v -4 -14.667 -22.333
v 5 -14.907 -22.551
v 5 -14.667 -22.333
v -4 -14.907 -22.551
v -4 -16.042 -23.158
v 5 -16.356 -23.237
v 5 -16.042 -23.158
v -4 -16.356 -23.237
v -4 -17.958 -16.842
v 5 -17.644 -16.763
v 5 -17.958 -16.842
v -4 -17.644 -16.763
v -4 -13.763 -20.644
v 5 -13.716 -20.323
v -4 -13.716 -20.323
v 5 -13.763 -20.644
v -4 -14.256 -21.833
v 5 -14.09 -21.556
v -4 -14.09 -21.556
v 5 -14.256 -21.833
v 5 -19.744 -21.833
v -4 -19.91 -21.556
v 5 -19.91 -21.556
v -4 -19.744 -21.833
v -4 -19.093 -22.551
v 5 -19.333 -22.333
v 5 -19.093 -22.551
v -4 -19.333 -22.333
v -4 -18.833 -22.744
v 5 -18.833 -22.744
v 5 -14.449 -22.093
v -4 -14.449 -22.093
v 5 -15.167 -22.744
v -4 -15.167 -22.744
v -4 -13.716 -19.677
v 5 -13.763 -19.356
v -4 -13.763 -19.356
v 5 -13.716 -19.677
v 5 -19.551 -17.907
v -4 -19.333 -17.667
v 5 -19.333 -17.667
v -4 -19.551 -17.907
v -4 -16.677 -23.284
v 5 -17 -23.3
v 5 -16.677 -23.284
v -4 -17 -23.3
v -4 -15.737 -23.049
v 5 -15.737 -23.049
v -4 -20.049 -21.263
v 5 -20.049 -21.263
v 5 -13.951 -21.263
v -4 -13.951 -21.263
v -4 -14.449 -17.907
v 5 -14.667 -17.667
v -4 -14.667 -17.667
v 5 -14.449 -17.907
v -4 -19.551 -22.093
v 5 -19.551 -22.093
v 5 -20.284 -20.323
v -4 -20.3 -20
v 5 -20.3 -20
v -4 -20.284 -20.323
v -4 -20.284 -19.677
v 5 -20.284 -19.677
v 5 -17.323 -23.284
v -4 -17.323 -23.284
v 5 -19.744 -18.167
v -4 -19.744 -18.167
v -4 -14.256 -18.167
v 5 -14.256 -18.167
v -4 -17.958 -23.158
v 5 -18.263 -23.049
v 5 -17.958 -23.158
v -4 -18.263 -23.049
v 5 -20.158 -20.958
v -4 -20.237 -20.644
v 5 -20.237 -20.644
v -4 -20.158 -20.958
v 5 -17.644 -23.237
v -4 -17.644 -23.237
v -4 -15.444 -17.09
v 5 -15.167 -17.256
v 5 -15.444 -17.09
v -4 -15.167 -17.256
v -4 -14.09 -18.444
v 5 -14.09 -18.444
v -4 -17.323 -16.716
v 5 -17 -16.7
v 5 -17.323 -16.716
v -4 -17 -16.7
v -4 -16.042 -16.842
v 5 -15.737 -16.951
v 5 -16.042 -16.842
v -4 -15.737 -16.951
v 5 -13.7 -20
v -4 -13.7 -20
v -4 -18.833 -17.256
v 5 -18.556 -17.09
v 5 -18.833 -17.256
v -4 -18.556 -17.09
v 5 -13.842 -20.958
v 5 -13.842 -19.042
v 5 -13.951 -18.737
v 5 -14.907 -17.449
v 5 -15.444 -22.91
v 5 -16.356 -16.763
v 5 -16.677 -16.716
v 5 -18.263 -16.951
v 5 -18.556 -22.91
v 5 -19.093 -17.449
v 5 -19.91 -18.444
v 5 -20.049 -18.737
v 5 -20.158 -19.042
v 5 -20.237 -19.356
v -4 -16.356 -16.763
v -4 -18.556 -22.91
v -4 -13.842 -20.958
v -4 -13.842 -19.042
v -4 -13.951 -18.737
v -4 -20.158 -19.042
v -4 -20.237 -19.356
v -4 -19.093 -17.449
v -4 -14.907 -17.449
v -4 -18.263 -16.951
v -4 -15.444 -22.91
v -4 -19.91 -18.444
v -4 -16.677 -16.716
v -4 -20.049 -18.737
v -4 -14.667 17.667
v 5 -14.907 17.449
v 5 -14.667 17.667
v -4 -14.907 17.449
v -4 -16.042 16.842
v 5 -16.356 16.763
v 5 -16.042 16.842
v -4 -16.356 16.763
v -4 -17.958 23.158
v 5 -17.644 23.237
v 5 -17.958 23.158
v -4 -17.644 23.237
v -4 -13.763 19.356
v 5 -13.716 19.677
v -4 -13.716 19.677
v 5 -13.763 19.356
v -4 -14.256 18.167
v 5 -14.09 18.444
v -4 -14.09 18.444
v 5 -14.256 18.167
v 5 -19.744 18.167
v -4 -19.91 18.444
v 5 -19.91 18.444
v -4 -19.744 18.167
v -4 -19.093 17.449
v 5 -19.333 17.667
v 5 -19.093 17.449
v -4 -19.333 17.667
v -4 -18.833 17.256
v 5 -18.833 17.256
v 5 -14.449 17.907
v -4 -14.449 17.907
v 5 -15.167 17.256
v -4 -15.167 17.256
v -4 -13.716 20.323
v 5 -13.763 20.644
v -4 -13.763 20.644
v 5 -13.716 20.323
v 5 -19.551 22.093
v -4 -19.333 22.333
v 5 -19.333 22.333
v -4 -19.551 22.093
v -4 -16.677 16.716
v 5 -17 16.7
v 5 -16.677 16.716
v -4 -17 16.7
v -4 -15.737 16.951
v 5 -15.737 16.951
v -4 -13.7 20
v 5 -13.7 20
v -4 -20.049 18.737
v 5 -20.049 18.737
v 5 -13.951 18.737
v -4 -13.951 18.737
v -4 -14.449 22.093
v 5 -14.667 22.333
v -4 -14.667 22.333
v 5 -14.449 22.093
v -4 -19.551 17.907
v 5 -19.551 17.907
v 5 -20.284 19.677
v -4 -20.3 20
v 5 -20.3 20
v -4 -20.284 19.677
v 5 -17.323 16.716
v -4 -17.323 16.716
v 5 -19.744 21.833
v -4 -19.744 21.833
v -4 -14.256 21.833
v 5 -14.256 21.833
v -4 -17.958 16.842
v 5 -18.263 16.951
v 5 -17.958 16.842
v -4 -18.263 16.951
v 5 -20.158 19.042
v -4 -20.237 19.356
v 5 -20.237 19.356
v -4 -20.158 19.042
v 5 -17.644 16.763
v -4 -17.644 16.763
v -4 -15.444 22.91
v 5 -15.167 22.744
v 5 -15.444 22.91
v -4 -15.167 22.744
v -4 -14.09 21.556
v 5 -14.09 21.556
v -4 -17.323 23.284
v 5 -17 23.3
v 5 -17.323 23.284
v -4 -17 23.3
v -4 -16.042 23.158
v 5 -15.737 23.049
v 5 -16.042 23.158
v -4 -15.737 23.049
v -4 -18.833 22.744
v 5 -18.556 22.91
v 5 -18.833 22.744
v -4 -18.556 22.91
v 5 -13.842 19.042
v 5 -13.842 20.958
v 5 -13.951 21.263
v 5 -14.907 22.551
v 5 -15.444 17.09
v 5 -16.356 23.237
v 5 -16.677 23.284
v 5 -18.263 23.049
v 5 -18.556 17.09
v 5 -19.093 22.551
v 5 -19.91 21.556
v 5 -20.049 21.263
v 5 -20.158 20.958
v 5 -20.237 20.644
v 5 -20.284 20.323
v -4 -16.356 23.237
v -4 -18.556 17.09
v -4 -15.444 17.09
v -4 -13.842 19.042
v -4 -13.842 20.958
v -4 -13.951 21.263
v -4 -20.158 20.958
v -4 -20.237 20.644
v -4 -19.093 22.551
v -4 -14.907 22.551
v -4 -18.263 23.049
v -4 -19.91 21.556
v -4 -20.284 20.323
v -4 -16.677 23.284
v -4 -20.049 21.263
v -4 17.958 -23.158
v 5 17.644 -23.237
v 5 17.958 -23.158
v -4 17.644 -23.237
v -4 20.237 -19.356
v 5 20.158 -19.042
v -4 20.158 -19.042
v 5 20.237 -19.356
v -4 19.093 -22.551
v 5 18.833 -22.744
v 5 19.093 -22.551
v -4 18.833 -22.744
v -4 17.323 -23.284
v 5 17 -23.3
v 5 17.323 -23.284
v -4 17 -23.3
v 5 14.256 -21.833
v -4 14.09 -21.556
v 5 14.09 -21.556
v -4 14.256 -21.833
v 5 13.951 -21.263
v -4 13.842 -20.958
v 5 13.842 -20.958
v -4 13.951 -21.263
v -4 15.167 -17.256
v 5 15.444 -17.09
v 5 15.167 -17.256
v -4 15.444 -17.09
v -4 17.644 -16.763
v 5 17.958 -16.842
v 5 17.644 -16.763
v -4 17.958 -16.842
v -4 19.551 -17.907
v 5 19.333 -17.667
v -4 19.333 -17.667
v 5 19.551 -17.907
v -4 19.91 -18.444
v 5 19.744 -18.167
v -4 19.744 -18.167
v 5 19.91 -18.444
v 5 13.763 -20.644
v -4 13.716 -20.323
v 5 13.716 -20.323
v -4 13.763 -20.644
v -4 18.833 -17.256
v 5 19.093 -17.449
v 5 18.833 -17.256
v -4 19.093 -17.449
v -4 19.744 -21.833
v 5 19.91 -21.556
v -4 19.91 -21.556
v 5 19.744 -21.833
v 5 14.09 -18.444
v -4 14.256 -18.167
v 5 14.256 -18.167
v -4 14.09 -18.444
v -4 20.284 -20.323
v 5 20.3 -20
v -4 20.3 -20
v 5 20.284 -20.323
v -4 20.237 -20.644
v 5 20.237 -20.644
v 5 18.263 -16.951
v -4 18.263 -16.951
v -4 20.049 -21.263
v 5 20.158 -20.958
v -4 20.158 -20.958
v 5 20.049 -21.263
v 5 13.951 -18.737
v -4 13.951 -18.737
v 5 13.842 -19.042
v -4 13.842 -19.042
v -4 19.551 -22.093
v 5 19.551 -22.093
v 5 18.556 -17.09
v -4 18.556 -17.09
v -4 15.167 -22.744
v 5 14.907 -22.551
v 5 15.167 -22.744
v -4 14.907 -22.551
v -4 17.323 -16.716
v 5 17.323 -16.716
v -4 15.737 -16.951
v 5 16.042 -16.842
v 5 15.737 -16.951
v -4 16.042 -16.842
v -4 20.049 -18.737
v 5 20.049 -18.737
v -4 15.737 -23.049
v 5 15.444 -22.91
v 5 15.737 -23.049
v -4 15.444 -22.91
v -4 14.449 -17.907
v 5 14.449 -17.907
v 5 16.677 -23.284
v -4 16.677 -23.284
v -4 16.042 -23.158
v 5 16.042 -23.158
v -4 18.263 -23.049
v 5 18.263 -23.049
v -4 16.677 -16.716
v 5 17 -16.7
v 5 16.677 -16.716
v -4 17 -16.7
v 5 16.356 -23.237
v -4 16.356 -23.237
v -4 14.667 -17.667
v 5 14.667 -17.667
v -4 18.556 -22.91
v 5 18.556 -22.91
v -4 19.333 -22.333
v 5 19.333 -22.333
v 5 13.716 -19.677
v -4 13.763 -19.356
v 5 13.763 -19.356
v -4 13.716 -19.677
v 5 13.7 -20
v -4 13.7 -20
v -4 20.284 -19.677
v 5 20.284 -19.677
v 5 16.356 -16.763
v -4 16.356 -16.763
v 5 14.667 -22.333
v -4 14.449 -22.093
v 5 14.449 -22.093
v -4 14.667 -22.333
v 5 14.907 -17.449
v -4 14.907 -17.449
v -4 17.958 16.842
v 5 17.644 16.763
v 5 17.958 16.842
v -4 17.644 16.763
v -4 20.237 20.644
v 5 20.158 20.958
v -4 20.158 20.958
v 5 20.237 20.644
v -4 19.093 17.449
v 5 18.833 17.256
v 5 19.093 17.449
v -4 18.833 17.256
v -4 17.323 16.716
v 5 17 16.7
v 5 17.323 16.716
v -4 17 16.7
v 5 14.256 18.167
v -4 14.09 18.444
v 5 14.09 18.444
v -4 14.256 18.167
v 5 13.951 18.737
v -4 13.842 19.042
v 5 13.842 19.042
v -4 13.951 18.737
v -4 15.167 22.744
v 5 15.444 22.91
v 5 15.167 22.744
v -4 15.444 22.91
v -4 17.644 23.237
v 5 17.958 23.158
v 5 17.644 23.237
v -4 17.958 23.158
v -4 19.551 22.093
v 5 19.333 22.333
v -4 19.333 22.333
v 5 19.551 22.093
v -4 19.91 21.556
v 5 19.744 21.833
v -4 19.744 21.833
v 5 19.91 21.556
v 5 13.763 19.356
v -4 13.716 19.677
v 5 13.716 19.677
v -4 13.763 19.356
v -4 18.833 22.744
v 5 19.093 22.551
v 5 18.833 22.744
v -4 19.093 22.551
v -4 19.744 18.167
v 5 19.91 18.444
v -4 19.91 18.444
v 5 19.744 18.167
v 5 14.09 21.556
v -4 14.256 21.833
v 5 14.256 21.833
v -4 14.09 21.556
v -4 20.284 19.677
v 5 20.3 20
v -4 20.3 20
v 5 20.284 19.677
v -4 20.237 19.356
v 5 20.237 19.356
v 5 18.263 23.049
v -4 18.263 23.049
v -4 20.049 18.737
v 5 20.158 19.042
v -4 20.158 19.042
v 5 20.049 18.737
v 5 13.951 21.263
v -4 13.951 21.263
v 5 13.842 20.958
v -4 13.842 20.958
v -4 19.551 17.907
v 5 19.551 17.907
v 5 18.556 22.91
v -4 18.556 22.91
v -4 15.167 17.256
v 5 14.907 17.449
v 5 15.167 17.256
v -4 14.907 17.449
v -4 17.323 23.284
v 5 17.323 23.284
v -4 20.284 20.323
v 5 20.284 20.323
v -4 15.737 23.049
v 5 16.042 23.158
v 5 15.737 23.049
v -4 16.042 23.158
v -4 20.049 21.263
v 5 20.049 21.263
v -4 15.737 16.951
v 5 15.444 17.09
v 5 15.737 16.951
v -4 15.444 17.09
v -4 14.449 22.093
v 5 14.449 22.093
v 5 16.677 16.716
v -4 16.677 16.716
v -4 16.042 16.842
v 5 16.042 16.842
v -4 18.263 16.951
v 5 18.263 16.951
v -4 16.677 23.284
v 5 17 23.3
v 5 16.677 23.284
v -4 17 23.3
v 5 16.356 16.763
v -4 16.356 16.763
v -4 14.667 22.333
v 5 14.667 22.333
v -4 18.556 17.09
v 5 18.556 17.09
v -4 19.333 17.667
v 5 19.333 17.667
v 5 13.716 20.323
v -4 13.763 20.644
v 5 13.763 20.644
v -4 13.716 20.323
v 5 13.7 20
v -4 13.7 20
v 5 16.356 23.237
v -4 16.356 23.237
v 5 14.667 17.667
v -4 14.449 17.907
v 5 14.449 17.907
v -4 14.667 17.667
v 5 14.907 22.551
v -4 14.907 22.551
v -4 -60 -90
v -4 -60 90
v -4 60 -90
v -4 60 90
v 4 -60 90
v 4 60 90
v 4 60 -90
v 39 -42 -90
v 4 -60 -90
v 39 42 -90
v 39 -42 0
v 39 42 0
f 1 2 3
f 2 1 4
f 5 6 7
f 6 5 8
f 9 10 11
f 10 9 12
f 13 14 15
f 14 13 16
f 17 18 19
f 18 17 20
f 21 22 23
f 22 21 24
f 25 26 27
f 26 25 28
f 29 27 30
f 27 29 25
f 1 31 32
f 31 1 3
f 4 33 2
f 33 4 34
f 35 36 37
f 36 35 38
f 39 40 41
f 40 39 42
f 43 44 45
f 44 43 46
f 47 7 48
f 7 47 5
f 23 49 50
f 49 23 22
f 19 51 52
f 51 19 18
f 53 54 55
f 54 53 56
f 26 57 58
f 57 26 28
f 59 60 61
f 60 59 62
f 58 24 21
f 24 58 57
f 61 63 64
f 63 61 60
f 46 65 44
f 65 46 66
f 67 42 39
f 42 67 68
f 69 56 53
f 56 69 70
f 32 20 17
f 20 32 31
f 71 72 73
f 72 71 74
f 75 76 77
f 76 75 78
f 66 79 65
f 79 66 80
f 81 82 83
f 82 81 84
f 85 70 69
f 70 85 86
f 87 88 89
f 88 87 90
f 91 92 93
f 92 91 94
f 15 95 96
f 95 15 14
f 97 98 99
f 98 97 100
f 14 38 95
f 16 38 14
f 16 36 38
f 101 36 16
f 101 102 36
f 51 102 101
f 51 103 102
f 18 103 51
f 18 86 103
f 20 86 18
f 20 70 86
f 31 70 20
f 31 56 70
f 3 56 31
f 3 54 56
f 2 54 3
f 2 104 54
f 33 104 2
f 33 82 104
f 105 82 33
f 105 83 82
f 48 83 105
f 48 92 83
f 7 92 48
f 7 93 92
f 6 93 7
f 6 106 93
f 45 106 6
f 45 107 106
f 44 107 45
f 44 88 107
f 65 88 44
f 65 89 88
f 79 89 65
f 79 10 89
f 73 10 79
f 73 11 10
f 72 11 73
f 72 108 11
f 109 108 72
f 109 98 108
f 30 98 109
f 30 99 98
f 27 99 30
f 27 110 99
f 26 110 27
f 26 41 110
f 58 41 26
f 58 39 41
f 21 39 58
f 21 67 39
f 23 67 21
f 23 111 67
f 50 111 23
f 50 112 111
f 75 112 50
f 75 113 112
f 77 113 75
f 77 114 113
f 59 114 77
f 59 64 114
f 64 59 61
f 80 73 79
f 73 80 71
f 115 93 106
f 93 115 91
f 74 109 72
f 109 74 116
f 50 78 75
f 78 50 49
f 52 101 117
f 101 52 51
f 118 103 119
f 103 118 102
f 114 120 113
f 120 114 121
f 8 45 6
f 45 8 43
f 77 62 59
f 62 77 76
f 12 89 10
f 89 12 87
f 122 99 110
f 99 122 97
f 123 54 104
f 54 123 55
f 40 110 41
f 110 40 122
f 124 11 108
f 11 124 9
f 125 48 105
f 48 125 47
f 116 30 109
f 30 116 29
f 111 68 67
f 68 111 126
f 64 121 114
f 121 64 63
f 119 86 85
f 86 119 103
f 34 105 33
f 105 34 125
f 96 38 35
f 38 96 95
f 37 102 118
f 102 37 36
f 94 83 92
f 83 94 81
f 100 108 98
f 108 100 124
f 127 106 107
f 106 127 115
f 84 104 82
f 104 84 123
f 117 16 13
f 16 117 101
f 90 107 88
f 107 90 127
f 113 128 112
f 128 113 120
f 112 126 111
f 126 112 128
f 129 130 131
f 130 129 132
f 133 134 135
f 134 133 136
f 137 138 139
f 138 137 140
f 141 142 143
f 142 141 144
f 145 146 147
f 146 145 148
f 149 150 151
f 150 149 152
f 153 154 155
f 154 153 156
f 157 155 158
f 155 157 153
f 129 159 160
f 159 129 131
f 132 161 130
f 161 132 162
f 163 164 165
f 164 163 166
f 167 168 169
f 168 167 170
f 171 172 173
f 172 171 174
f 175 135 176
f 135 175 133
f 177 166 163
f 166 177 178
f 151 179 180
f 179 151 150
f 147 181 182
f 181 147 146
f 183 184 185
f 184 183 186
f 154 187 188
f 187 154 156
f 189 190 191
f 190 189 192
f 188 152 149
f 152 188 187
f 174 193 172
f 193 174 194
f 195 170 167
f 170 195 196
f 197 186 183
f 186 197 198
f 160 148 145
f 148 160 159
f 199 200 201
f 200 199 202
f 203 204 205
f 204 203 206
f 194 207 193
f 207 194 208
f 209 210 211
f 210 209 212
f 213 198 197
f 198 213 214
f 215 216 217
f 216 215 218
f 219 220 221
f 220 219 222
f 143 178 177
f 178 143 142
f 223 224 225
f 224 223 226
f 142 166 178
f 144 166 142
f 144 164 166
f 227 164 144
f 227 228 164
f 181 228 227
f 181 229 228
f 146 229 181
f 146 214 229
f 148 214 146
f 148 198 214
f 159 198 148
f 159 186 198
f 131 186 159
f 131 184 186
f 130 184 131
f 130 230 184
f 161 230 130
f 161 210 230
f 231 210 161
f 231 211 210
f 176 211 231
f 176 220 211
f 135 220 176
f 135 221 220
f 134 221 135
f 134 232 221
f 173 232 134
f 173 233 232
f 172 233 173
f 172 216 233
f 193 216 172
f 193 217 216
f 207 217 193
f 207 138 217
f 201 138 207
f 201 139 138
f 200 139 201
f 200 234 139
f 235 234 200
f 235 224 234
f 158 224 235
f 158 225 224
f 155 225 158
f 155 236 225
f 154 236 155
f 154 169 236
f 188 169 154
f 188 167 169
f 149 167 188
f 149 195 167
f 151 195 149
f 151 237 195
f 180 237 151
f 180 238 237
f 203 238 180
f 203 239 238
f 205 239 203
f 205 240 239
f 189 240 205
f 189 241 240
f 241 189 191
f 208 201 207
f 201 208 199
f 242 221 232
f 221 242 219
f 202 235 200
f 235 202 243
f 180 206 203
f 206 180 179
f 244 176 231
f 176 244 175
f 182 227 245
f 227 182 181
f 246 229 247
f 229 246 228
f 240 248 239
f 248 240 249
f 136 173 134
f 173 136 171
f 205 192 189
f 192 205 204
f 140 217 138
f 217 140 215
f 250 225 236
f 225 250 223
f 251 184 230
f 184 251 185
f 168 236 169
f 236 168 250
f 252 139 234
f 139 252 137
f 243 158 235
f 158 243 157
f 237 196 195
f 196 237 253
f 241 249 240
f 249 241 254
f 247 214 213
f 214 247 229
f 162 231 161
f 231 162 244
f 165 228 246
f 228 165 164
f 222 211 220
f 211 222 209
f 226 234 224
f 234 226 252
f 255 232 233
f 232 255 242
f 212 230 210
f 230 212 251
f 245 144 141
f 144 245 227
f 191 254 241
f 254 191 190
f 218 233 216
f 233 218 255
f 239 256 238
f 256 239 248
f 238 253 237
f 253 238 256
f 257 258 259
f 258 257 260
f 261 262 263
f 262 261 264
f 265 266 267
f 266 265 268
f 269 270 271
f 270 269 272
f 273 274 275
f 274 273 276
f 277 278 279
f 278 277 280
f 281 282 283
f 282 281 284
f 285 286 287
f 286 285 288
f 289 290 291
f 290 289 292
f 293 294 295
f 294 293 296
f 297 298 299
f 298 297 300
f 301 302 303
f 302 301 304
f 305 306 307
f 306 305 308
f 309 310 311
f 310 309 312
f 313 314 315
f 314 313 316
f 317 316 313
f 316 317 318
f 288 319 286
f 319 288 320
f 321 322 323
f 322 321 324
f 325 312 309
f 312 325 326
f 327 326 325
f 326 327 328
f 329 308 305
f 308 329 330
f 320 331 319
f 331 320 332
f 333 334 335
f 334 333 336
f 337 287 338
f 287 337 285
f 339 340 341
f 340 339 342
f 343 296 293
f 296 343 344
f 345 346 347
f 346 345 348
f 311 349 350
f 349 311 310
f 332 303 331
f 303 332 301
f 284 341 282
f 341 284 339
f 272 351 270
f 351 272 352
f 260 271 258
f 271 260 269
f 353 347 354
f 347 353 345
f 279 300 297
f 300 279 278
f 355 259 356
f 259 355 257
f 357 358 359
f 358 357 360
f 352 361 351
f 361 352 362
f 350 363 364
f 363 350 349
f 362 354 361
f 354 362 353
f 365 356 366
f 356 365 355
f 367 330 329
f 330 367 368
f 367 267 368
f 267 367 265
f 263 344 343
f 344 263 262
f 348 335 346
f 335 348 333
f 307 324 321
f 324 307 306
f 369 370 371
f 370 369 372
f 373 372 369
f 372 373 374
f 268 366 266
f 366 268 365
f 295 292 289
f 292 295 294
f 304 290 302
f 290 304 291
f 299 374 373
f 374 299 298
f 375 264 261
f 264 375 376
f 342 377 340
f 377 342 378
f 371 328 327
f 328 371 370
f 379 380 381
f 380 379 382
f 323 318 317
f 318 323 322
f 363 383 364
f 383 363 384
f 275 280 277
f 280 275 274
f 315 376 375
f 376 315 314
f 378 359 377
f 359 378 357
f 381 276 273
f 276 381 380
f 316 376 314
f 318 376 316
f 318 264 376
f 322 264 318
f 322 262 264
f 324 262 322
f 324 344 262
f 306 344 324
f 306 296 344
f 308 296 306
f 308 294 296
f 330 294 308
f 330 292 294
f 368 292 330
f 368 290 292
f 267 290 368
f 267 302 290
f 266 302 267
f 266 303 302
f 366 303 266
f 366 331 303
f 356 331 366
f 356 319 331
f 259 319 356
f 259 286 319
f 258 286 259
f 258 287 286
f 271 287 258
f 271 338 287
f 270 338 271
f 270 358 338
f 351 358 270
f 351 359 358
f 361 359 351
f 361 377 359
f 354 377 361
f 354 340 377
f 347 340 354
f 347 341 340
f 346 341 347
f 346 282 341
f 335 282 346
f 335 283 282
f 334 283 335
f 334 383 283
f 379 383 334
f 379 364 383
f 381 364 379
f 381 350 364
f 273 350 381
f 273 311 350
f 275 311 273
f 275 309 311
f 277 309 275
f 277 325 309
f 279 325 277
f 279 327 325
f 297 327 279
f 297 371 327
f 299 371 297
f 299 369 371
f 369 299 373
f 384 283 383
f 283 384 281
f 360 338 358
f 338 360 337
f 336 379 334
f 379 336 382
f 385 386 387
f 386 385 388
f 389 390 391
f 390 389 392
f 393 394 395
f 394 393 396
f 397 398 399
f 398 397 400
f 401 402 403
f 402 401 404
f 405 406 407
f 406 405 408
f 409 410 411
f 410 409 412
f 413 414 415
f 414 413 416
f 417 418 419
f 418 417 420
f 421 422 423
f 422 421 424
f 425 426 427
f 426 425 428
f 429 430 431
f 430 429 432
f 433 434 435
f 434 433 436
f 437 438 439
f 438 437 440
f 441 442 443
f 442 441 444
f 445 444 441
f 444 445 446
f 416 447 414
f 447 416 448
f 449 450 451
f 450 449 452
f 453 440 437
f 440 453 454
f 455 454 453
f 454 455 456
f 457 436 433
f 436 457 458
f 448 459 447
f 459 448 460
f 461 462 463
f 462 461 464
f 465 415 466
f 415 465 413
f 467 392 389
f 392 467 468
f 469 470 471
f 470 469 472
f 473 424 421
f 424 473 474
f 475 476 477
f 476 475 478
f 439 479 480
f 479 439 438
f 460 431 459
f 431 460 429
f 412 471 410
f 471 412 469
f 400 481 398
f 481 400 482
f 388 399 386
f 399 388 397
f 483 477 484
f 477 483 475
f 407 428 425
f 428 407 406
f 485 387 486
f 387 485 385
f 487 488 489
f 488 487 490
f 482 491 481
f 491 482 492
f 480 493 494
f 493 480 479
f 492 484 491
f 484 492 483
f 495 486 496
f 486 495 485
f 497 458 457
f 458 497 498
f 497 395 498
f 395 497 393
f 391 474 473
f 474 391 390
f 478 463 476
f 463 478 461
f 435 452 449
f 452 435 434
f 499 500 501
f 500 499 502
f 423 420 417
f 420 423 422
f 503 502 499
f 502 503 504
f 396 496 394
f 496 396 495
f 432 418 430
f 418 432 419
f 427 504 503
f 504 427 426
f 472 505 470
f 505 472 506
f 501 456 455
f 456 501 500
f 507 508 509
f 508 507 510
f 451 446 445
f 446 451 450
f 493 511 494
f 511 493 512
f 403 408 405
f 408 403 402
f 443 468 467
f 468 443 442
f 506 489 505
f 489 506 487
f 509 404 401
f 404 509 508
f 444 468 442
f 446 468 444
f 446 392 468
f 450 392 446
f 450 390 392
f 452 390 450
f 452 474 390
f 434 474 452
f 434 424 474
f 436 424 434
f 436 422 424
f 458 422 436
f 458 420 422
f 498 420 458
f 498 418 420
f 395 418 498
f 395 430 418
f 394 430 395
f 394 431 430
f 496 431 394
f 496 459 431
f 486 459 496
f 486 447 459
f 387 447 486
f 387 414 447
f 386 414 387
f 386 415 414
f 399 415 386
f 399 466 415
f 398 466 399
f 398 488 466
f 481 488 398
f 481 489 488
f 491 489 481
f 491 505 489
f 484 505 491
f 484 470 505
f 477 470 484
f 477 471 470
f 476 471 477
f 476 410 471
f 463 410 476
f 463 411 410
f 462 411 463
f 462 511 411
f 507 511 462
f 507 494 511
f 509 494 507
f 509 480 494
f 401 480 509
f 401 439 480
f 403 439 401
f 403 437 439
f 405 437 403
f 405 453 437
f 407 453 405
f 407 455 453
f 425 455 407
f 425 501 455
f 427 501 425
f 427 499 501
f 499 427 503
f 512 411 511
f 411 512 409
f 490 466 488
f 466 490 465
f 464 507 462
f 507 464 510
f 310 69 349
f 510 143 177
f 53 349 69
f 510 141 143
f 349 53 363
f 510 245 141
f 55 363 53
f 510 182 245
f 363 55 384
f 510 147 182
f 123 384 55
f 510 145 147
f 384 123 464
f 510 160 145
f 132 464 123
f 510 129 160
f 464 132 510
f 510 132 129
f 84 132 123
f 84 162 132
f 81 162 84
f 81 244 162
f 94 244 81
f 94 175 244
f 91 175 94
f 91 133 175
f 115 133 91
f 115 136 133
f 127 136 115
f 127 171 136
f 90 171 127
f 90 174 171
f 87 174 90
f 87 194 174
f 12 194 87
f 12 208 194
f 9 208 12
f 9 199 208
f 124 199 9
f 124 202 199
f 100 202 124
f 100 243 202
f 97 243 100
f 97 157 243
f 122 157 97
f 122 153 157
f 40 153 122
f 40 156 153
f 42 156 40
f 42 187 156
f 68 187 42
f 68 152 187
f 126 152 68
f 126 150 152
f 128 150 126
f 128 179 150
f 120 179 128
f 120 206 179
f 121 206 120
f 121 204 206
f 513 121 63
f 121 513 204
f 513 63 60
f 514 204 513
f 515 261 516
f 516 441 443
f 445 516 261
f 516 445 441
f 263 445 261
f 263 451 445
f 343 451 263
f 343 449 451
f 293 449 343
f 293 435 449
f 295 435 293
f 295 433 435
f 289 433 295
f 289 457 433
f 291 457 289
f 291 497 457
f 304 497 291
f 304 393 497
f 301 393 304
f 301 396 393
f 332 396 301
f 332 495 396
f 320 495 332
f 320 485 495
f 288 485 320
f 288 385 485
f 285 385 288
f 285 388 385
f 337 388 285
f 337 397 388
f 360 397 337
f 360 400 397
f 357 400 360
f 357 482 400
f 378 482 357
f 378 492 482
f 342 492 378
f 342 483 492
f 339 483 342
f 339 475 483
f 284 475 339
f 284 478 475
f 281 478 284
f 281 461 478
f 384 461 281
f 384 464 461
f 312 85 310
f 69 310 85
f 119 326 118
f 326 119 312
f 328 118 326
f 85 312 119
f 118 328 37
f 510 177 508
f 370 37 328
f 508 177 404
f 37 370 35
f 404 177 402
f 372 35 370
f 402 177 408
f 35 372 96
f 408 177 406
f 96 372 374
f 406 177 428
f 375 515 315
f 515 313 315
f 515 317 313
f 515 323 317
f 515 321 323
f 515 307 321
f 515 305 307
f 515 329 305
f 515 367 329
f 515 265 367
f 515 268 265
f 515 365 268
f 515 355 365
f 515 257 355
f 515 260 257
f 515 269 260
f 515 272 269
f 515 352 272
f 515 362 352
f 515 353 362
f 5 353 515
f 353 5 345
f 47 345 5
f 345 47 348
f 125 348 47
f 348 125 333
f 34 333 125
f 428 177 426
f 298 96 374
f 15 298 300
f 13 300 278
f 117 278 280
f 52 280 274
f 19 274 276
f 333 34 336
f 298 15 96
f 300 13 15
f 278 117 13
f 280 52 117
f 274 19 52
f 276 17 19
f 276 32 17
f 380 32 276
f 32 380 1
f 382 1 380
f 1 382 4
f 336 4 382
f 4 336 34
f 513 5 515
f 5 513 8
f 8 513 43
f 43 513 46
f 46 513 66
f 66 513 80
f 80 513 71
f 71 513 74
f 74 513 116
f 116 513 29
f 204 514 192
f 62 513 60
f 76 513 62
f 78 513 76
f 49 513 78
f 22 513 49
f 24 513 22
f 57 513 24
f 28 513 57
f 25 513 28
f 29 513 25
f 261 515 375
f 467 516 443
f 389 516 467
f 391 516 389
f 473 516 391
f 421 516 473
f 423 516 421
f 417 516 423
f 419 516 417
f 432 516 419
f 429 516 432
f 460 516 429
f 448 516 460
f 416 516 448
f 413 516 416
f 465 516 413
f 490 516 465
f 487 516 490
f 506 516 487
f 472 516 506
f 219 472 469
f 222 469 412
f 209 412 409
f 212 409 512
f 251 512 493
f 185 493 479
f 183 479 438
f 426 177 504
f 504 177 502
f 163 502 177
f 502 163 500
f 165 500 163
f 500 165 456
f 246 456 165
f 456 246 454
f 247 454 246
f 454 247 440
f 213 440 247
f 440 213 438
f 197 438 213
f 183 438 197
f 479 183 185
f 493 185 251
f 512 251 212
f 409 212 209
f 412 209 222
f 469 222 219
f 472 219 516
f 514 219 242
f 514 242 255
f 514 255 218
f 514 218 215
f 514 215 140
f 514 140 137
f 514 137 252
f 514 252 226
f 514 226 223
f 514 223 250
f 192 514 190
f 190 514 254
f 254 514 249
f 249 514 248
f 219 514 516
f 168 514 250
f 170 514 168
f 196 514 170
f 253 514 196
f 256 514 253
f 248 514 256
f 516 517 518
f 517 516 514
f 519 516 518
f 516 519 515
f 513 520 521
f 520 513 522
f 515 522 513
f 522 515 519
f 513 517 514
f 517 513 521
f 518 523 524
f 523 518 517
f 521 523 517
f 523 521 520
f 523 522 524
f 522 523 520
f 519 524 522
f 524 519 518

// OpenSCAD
// Side support plate concept v1
// Isolated concept file for reviewing outer mount plate transition into side support plates.

$fn = 64;

plate_w = 120;
plate_h = 180;
plate_t = 8;
hole_dx = 34;
hole_dz = 40;
hole_d = 6.6;
brace_leg = 70;

module side_support_plate(){
  difference(){
    hull(){
      cube([plate_t, plate_w, plate_h], center=true);
      translate([brace_leg/2,0,-plate_h/4]) cube([plate_t, plate_w*0.7, plate_h*0.5], center=true);
    }

    for(y=[-hole_dx/2, hole_dx/2])
      for(z=[-hole_dz/2, hole_dz/2])
        translate([0,y,z]) rotate([0,90,0]) cylinder(h=plate_t+2, d=hole_d, center=true);
  }
}

color([0.55,0.58,0.66,0.95]) side_support_plate();
